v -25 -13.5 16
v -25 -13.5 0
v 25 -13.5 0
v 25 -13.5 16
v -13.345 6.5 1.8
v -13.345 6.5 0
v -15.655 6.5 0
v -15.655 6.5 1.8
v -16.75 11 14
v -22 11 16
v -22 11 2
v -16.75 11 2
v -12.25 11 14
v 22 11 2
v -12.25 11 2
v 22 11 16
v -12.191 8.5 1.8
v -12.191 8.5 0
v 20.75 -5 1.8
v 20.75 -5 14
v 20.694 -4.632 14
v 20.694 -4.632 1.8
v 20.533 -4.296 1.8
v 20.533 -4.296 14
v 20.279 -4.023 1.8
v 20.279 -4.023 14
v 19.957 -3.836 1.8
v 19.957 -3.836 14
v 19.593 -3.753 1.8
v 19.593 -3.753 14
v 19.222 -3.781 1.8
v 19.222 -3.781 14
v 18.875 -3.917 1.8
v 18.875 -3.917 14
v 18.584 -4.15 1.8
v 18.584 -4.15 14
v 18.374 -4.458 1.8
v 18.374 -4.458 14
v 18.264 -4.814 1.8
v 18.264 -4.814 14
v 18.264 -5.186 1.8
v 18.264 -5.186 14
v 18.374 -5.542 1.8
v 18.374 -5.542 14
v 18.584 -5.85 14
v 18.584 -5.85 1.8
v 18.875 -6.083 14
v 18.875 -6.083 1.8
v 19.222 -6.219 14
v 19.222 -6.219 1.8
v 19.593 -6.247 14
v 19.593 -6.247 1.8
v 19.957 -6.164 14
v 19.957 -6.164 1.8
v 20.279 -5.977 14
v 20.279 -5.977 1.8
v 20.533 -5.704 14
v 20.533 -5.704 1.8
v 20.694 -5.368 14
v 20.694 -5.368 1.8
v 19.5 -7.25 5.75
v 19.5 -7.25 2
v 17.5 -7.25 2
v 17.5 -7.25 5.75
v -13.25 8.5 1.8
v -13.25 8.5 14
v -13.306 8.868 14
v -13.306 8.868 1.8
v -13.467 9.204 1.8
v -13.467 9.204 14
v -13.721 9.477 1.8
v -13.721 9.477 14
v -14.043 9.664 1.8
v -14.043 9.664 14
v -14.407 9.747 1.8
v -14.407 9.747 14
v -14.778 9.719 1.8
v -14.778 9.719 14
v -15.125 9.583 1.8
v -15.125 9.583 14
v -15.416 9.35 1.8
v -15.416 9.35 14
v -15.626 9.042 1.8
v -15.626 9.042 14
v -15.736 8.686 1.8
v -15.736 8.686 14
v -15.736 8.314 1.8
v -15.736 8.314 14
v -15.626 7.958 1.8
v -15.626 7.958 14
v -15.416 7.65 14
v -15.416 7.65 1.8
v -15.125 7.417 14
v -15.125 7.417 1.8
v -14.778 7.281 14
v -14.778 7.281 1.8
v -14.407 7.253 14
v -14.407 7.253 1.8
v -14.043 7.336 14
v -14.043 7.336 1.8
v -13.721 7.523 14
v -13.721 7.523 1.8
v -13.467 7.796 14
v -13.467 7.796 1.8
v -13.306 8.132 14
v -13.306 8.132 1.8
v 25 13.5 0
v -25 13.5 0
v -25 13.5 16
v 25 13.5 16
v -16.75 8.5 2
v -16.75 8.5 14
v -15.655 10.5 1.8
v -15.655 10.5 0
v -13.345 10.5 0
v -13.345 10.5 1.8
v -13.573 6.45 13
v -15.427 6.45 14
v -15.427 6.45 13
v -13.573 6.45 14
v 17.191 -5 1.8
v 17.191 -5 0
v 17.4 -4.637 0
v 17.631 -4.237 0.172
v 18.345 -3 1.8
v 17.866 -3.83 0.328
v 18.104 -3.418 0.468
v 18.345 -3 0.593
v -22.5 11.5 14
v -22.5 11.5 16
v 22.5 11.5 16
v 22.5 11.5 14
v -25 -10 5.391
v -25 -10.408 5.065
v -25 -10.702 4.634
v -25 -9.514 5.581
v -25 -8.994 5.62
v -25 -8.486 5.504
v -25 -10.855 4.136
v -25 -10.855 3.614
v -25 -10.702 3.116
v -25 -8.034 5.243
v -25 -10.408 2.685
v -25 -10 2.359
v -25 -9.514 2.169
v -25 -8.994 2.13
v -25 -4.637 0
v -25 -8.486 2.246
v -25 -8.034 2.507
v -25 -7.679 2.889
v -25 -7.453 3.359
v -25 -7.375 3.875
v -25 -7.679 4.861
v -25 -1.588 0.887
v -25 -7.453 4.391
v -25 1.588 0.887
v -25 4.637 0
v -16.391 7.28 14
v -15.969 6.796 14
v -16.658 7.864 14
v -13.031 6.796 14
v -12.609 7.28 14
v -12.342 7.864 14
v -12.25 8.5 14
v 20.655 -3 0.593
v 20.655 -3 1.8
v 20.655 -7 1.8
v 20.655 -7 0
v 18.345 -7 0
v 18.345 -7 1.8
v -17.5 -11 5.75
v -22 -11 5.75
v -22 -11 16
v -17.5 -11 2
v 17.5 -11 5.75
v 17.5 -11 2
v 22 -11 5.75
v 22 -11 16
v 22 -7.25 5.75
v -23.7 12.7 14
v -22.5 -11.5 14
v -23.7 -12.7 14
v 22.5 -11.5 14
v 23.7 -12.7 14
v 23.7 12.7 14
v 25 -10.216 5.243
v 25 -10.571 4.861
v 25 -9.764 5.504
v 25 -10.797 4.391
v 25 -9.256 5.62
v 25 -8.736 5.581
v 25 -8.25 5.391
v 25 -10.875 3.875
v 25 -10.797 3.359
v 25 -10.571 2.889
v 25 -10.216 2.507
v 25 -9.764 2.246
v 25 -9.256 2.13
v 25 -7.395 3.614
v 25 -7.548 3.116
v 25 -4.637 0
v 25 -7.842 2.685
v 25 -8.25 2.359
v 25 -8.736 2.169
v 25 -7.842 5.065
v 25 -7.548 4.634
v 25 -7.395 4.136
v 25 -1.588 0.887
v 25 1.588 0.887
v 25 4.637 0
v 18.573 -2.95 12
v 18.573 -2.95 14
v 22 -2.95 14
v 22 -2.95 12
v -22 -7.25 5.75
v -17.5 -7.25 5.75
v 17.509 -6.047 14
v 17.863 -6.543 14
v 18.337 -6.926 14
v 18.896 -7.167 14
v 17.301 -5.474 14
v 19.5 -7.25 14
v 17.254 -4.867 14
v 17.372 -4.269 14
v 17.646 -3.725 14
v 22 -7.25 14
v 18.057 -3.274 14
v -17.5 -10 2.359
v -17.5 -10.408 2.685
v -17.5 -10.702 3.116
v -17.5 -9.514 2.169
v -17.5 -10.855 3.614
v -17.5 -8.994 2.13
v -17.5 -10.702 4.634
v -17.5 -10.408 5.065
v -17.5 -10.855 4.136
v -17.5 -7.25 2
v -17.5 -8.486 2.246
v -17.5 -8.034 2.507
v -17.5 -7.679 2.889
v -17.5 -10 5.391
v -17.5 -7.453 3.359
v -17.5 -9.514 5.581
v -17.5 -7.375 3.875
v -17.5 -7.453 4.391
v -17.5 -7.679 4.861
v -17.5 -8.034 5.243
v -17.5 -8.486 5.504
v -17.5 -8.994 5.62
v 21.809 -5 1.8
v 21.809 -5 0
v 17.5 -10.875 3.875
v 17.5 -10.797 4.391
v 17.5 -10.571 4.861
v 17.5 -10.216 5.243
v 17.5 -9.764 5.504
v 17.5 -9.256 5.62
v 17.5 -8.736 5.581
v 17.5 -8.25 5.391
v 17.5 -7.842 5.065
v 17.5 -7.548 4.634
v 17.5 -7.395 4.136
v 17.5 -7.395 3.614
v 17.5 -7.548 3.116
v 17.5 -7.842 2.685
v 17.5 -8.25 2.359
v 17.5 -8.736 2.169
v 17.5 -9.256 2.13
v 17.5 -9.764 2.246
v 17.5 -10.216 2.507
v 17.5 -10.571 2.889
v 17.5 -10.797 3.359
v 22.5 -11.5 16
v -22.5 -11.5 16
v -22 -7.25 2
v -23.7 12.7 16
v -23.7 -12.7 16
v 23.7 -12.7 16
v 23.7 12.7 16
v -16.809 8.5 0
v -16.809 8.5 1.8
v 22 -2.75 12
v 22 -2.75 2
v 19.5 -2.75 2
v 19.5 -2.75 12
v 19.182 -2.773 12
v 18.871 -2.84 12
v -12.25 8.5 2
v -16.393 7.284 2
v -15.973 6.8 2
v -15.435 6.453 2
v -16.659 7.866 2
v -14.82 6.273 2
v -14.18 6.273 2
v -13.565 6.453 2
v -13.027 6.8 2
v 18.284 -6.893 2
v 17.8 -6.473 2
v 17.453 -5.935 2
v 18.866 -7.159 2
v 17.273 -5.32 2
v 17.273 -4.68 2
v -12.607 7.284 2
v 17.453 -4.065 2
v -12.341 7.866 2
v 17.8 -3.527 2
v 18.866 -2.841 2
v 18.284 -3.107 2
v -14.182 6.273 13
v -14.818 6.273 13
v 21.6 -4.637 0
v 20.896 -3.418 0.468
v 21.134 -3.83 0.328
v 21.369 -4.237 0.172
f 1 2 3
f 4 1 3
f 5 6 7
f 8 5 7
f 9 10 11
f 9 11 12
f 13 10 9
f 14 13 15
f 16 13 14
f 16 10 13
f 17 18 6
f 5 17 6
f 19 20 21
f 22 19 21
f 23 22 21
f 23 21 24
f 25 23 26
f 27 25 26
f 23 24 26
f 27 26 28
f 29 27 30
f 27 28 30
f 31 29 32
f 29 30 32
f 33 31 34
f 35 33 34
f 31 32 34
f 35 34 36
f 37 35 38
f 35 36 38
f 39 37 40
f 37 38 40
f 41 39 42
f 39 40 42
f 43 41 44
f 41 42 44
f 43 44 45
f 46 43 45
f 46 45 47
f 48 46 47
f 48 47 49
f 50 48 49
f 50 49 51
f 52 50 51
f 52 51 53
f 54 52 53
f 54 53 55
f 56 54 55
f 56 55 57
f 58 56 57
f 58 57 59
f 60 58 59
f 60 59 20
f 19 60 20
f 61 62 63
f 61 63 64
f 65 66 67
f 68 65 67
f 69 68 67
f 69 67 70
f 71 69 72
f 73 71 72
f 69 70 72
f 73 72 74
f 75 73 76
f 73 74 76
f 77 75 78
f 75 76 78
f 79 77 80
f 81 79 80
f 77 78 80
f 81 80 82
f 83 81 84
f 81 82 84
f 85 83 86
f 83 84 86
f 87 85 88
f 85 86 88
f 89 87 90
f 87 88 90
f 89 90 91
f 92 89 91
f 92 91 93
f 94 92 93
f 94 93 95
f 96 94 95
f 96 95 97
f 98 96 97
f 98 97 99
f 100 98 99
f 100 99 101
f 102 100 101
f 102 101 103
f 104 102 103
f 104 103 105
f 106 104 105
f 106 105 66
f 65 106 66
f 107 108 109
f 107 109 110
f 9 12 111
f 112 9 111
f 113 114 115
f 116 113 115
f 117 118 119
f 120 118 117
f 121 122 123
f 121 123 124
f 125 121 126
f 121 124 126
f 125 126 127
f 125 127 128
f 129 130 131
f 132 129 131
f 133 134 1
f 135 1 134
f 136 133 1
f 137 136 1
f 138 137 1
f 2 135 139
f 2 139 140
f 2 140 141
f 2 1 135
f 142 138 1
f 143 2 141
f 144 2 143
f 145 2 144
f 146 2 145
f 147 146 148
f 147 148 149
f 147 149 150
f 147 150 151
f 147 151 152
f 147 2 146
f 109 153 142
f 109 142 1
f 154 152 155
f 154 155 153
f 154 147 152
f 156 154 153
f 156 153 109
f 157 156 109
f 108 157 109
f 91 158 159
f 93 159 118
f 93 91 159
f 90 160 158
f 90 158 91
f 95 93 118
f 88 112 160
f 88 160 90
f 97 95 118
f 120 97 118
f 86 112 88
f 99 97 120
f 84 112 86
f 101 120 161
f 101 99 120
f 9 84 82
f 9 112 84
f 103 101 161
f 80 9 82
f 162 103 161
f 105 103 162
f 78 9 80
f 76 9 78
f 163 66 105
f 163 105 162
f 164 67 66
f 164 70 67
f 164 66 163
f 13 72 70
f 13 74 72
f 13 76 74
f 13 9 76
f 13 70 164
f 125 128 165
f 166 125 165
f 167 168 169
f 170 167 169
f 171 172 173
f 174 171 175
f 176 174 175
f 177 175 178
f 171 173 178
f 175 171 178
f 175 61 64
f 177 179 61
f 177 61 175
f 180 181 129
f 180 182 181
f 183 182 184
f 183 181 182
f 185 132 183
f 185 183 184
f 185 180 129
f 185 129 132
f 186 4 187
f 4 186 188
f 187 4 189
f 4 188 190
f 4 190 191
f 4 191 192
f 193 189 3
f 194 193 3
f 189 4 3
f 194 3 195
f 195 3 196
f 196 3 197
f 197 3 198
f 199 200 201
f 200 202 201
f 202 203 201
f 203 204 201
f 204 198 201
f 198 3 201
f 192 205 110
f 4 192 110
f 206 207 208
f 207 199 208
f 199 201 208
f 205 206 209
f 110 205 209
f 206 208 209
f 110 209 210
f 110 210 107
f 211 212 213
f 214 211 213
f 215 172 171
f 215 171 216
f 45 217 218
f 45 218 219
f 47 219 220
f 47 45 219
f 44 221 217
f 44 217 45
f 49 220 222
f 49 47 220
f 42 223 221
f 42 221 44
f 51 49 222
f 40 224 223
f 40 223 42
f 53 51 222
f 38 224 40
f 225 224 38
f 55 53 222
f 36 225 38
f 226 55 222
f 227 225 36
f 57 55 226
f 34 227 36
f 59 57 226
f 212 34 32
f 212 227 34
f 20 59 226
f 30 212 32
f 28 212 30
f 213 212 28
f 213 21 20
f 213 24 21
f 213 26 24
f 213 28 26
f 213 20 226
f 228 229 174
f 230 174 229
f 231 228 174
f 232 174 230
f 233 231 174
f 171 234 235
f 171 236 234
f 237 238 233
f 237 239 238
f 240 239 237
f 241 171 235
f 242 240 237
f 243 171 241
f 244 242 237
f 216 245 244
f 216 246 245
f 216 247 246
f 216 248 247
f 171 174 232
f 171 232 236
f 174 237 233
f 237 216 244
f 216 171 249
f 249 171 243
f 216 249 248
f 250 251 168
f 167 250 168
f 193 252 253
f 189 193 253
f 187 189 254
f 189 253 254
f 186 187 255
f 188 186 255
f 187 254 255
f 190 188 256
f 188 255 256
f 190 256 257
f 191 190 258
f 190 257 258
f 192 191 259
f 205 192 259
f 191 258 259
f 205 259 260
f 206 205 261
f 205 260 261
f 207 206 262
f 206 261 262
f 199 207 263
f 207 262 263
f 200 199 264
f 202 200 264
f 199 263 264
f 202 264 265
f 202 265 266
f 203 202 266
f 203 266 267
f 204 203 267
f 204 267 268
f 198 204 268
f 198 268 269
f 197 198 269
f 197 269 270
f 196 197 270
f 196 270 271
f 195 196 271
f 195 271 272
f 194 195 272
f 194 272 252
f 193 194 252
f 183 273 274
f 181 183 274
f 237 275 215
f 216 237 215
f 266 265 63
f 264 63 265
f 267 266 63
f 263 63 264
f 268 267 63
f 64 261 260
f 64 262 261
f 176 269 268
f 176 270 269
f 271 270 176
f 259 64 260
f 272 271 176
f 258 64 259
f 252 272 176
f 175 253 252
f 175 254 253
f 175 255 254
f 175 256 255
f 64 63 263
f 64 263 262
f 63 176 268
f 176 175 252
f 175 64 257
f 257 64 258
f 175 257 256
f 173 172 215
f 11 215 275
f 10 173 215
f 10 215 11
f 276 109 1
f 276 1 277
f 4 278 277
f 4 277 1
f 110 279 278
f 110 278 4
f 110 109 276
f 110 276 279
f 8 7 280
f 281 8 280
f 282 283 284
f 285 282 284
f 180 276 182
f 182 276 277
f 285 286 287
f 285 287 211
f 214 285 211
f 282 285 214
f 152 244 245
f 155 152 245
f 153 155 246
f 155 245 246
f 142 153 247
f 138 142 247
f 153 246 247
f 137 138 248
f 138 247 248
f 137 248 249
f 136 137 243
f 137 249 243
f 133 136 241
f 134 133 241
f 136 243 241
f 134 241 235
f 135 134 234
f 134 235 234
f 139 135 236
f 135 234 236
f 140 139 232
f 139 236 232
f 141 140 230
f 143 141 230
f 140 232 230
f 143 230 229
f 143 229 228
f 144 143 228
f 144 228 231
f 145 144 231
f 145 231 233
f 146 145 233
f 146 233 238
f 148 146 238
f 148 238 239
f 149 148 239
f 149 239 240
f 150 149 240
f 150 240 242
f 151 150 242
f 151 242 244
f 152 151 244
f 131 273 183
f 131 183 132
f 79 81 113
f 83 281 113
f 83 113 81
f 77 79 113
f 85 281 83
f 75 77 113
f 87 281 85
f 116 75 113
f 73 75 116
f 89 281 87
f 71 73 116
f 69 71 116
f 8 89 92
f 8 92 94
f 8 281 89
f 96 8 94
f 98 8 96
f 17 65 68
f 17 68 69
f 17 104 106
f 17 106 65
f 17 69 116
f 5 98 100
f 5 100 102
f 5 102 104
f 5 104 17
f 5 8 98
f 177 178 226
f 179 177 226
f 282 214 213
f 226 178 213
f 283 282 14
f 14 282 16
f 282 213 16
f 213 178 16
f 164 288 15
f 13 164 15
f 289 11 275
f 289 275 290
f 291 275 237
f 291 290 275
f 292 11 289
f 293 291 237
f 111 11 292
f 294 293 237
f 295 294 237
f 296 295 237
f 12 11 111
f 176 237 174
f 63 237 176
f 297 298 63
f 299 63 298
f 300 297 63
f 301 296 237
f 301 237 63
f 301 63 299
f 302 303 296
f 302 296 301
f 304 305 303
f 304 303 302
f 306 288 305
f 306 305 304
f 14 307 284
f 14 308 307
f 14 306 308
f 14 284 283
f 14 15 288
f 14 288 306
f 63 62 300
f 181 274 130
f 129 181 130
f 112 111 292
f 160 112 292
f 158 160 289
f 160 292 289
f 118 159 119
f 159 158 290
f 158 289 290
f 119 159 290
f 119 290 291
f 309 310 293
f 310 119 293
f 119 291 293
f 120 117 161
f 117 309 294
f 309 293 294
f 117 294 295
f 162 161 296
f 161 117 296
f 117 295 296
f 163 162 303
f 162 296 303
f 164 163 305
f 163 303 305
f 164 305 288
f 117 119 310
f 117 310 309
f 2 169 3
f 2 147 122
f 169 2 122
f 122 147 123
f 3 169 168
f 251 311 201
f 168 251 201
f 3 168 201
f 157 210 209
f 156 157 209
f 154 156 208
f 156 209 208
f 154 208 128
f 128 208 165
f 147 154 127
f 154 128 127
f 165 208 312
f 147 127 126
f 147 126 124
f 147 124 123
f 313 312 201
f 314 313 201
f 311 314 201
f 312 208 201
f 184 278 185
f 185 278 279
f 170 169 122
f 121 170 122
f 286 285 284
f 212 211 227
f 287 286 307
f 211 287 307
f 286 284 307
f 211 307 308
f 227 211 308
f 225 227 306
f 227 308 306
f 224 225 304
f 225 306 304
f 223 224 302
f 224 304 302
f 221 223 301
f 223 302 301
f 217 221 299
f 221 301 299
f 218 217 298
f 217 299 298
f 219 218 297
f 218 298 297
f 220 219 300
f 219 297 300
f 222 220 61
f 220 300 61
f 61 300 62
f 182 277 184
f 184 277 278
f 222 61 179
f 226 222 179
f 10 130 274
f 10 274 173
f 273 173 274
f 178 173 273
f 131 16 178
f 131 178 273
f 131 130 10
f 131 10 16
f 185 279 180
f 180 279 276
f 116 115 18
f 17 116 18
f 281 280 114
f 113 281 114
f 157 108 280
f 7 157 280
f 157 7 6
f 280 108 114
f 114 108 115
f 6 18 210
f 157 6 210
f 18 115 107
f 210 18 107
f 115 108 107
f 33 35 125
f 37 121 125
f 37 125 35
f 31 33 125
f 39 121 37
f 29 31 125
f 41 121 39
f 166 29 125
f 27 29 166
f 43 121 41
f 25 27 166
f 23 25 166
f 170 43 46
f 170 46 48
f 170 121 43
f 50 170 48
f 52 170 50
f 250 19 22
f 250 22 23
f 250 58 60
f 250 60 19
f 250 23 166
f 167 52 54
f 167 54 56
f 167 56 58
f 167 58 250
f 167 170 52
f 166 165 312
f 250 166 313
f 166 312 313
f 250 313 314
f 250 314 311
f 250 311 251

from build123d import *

# Parameters (mm, degrees)
F0_W      = 50
F0_H      = 27
F1_DEPTH  = 16
F2_W      = 44
F2_H      = 22
F3_DEPTH  = 14
F5_DEPTH  = 12
F6_R      = 1.25
F8_DEPTH  = 14.001
F7_R      = 1.25
F9_DEPTH  = 14.001
F11_DEPTH = 1.8
F13_DEPTH = 2
F14_W     = 4
F14_H     = 0.2
F15_DEPTH = 1
F16_W     = 1.2
F16_H     = 0.5
F16_H_2   = 23
F17_DEPTH = 2
F18_W     = 3.75
F18_H     = 3.75
F19_DEPTH = 4.5
F20_W     = 3.75
F20_H     = 3.75
F21_DEPTH = 4.5
F22_R     = 1.75
F23_DEPTH = 7.501
F24_R     = 1.75
F25_DEPTH = 7.501
F26_R     = 11.25
F27_DEPTH = 29.5


with BuildPart() as f1:
    # F0 (on Top) → F1 (new body)
    with BuildSketch(Plane.XY):
        Rectangle(F0_W, F0_H)
    extrude(amount=F1_DEPTH)

    # F2 (on face) → F3 (cut)
    with BuildSketch(Plane.XY.offset(16)):
        Rectangle(F2_W, F2_H)
    extrude(amount=-F3_DEPTH, mode=Mode.SUBTRACT)

    # F4 (on face) → F5 (join)
    with BuildSketch(Plane.XY.offset(2)):
        with BuildLine():
            ThreePointArc((19.5, -7.25), (21.0909902577, -6.5909902577), (21.75, -5))
            ThreePointArc((21.75, -5), (21.0909902577, -3.4090097423), (19.5, -2.75))
            Line((19.5, -2.75), (19.5, -7.25))
        make_face()
        with BuildLine():
            ThreePointArc((19.5, -2.75), (21.0909902577, -3.4090097423), (21.75, -5))
            ThreePointArc((21.75, -5), (21.0909902577, -6.5909902577), (19.5, -7.25))
            Line((19.5, -7.25), (22, -7.25))
            Line((22, -7.25), (22, -2.75))
            Line((22, -2.75), (19.5, -2.75))
        make_face()
        with BuildLine():
            Line((19.5, -7.25), (19.5, -2.75))
            ThreePointArc((19.5, -2.75), (17.25, -5), (19.5, -7.25))
        make_face()
        with BuildLine():
            Line((-16.75, 8.5), (-12.25, 8.5))
            ThreePointArc((-12.25, 8.5), (-14.5, 10.75), (-16.75, 8.5))
        make_face()
        with BuildLine():
            ThreePointArc((-16.75, 8.5), (-14.5, 6.25), (-12.25, 8.5))
            Line((-12.25, 8.5), (-16.75, 8.5))
        make_face()
        with BuildLine():
            ThreePointArc((-16.75, 8.5), (-14.5, 10.75), (-12.25, 8.5))
            Line((-12.25, 8.5), (-12.25, 11))
            Line((-12.25, 11), (-16.75, 11))
            Line((-16.75, 11), (-16.75, 8.5))
        make_face()
    extrude(amount=F5_DEPTH)

    # F6 (on face) → F8 (cut, through all)
    with BuildSketch(Plane.XY.offset(14)):
        with Locations((-14.5, 8.5)):
            Circle(F6_R)
    extrude(amount=-F8_DEPTH, mode=Mode.SUBTRACT)

    # F7 (on face) → F9 (cut, through all)
    with BuildSketch(Plane.XY.offset(14)):
        with Locations((19.5, -5)):
            Circle(F7_R)
    extrude(amount=-F9_DEPTH, mode=Mode.SUBTRACT)

    # F10 (on face) → F11 (cut)
    with BuildSketch(Plane(origin=(0, 0, 0), x_dir=(1, 0, 0), z_dir=(0, 0, -1))):
        Polygon((-15.6547005384, -10.5), (-13.3452994616, -10.5), (-12.1905989232, -8.5), (-13.3452994616, -6.5), (-15.6547005384, -6.5), (-16.8094010768, -8.5), align=None)
        Polygon((20.6547005384, 7), (18.3452994616, 7), (17.1905989232, 5), (18.3452994616, 3), (20.6547005384, 3), (21.8094010768, 5), align=None)
    extrude(amount=-F11_DEPTH, mode=Mode.SUBTRACT)

    # F12 (on face) → F13 (cut)
    with BuildSketch(Plane.XY.offset(14)):
        with BuildLine():
            Line((22, -2.95), (22, -2.75))
            Line((22, -2.75), (19.5, -2.75))
            ThreePointArc((19.5, -2.75), (19.025658351, -2.8005682552), (18.5726381505, -2.95))
            Line((18.5726381505, -2.95), (22, -2.95))
        make_face()
    extrude(amount=-F13_DEPTH, mode=Mode.SUBTRACT)

    # F14 (on face) → F15 (cut)
    with BuildSketch(Plane.XY.offset(14)):
        with Locations((-14.2456165999, 6.35)):
            Rectangle(F14_W, F14_H)
    extrude(amount=-F15_DEPTH, mode=Mode.SUBTRACT)

    # F16 (on face) → F17 (cut)
    with BuildSketch(Plane.XY.offset(16)):
        Polygon((-22.5, -11.5), (-22.5, -12), (-23.7, -12), (-23.7, -12.7), (23.7, -12.7), (23.7, -12), (22.5, -12), (22.5, -11.5), align=None)
        with Locations((-23.1, -11.75)):
            Rectangle(F16_W, F16_H)
        with Locations((-23.1, 0)):
            Rectangle(F16_W, F16_H_2)
        with Locations((-23.1, 11.75)):
            Rectangle(F16_W, F16_H)
        Polygon((-22.5, 12), (-22.5, 11.5), (22.5, 11.5), (22.5, 12), (23.7, 12), (23.7, 12.7), (-23.7, 12.7), (-23.7, 12), align=None)
        with Locations((23.1, -11.75)):
            Rectangle(F16_W, F16_H)
        with Locations((23.1, 0)):
            Rectangle(F16_W, F16_H_2)
        with Locations((23.1, 11.75)):
            Rectangle(F16_W, F16_H)
    extrude(amount=-F17_DEPTH, mode=Mode.SUBTRACT)

    # F18 (on face) → F19 (join)
    with BuildSketch(Plane(origin=(22, 0, 0), x_dir=(0, -1, 0), z_dir=(-1, 0, 0))):
        with Locations((9.125, 3.875)):
            Rectangle(F18_W, F18_H)
    extrude(amount=F19_DEPTH)

    # F20 (on face) → F21 (join)
    with BuildSketch(Plane.YZ.offset(-22)):
        with Locations((-9.125, 3.875)):
            Rectangle(F20_W, F20_H)
    extrude(amount=F21_DEPTH)

    # F22 (on face) → F23 (cut, through all)
    with BuildSketch(Plane.YZ.offset(-17.5)):
        with Locations((-9.125, 3.875)):
            Circle(F22_R)
    extrude(amount=-F23_DEPTH, mode=Mode.SUBTRACT)

    # F24 (on face) → F25 (cut, through all)
    with BuildSketch(Plane(origin=(17.5, 0, 0), x_dir=(0, -1, 0), z_dir=(-1, 0, 0))):
        with Locations((9.125, 3.875)):
            Circle(F24_R)
    extrude(amount=-F25_DEPTH, mode=Mode.SUBTRACT)

    # F26 (on Right) → F27 (cut, symmetric)
    with BuildSketch(Plane.YZ):
        with Locations((0, -10.25)):
            Circle(F26_R)
    extrude(amount=F27_DEPTH, both=True, mode=Mode.SUBTRACT)


solid = f1.part
